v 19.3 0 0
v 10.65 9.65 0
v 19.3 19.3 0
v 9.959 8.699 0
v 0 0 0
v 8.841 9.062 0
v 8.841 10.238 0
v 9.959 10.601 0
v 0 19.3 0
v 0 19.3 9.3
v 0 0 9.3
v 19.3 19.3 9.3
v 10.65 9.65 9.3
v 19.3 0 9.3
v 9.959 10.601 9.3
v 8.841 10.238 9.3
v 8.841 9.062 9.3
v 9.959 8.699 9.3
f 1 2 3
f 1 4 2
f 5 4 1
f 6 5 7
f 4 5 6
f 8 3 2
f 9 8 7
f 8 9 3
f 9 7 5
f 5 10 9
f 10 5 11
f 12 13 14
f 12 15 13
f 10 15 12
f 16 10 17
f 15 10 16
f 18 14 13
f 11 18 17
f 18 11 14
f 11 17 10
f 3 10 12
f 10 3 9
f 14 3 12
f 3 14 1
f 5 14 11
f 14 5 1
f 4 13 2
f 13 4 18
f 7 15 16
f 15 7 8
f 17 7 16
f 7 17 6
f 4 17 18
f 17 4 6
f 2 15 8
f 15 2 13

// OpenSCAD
// Model of the CR-10 stock hotend.
width = 19.3;
length = 19.3;
height = 9.3;


difference([24,0,0]) {
    linear_extrude(height) {
        square([width, length]);
    };
    translate([width/2,length/2,0]) {
        linear_extrude(height) {
            circle(diameter=8);
        }
    };
};


echo(version=version());
